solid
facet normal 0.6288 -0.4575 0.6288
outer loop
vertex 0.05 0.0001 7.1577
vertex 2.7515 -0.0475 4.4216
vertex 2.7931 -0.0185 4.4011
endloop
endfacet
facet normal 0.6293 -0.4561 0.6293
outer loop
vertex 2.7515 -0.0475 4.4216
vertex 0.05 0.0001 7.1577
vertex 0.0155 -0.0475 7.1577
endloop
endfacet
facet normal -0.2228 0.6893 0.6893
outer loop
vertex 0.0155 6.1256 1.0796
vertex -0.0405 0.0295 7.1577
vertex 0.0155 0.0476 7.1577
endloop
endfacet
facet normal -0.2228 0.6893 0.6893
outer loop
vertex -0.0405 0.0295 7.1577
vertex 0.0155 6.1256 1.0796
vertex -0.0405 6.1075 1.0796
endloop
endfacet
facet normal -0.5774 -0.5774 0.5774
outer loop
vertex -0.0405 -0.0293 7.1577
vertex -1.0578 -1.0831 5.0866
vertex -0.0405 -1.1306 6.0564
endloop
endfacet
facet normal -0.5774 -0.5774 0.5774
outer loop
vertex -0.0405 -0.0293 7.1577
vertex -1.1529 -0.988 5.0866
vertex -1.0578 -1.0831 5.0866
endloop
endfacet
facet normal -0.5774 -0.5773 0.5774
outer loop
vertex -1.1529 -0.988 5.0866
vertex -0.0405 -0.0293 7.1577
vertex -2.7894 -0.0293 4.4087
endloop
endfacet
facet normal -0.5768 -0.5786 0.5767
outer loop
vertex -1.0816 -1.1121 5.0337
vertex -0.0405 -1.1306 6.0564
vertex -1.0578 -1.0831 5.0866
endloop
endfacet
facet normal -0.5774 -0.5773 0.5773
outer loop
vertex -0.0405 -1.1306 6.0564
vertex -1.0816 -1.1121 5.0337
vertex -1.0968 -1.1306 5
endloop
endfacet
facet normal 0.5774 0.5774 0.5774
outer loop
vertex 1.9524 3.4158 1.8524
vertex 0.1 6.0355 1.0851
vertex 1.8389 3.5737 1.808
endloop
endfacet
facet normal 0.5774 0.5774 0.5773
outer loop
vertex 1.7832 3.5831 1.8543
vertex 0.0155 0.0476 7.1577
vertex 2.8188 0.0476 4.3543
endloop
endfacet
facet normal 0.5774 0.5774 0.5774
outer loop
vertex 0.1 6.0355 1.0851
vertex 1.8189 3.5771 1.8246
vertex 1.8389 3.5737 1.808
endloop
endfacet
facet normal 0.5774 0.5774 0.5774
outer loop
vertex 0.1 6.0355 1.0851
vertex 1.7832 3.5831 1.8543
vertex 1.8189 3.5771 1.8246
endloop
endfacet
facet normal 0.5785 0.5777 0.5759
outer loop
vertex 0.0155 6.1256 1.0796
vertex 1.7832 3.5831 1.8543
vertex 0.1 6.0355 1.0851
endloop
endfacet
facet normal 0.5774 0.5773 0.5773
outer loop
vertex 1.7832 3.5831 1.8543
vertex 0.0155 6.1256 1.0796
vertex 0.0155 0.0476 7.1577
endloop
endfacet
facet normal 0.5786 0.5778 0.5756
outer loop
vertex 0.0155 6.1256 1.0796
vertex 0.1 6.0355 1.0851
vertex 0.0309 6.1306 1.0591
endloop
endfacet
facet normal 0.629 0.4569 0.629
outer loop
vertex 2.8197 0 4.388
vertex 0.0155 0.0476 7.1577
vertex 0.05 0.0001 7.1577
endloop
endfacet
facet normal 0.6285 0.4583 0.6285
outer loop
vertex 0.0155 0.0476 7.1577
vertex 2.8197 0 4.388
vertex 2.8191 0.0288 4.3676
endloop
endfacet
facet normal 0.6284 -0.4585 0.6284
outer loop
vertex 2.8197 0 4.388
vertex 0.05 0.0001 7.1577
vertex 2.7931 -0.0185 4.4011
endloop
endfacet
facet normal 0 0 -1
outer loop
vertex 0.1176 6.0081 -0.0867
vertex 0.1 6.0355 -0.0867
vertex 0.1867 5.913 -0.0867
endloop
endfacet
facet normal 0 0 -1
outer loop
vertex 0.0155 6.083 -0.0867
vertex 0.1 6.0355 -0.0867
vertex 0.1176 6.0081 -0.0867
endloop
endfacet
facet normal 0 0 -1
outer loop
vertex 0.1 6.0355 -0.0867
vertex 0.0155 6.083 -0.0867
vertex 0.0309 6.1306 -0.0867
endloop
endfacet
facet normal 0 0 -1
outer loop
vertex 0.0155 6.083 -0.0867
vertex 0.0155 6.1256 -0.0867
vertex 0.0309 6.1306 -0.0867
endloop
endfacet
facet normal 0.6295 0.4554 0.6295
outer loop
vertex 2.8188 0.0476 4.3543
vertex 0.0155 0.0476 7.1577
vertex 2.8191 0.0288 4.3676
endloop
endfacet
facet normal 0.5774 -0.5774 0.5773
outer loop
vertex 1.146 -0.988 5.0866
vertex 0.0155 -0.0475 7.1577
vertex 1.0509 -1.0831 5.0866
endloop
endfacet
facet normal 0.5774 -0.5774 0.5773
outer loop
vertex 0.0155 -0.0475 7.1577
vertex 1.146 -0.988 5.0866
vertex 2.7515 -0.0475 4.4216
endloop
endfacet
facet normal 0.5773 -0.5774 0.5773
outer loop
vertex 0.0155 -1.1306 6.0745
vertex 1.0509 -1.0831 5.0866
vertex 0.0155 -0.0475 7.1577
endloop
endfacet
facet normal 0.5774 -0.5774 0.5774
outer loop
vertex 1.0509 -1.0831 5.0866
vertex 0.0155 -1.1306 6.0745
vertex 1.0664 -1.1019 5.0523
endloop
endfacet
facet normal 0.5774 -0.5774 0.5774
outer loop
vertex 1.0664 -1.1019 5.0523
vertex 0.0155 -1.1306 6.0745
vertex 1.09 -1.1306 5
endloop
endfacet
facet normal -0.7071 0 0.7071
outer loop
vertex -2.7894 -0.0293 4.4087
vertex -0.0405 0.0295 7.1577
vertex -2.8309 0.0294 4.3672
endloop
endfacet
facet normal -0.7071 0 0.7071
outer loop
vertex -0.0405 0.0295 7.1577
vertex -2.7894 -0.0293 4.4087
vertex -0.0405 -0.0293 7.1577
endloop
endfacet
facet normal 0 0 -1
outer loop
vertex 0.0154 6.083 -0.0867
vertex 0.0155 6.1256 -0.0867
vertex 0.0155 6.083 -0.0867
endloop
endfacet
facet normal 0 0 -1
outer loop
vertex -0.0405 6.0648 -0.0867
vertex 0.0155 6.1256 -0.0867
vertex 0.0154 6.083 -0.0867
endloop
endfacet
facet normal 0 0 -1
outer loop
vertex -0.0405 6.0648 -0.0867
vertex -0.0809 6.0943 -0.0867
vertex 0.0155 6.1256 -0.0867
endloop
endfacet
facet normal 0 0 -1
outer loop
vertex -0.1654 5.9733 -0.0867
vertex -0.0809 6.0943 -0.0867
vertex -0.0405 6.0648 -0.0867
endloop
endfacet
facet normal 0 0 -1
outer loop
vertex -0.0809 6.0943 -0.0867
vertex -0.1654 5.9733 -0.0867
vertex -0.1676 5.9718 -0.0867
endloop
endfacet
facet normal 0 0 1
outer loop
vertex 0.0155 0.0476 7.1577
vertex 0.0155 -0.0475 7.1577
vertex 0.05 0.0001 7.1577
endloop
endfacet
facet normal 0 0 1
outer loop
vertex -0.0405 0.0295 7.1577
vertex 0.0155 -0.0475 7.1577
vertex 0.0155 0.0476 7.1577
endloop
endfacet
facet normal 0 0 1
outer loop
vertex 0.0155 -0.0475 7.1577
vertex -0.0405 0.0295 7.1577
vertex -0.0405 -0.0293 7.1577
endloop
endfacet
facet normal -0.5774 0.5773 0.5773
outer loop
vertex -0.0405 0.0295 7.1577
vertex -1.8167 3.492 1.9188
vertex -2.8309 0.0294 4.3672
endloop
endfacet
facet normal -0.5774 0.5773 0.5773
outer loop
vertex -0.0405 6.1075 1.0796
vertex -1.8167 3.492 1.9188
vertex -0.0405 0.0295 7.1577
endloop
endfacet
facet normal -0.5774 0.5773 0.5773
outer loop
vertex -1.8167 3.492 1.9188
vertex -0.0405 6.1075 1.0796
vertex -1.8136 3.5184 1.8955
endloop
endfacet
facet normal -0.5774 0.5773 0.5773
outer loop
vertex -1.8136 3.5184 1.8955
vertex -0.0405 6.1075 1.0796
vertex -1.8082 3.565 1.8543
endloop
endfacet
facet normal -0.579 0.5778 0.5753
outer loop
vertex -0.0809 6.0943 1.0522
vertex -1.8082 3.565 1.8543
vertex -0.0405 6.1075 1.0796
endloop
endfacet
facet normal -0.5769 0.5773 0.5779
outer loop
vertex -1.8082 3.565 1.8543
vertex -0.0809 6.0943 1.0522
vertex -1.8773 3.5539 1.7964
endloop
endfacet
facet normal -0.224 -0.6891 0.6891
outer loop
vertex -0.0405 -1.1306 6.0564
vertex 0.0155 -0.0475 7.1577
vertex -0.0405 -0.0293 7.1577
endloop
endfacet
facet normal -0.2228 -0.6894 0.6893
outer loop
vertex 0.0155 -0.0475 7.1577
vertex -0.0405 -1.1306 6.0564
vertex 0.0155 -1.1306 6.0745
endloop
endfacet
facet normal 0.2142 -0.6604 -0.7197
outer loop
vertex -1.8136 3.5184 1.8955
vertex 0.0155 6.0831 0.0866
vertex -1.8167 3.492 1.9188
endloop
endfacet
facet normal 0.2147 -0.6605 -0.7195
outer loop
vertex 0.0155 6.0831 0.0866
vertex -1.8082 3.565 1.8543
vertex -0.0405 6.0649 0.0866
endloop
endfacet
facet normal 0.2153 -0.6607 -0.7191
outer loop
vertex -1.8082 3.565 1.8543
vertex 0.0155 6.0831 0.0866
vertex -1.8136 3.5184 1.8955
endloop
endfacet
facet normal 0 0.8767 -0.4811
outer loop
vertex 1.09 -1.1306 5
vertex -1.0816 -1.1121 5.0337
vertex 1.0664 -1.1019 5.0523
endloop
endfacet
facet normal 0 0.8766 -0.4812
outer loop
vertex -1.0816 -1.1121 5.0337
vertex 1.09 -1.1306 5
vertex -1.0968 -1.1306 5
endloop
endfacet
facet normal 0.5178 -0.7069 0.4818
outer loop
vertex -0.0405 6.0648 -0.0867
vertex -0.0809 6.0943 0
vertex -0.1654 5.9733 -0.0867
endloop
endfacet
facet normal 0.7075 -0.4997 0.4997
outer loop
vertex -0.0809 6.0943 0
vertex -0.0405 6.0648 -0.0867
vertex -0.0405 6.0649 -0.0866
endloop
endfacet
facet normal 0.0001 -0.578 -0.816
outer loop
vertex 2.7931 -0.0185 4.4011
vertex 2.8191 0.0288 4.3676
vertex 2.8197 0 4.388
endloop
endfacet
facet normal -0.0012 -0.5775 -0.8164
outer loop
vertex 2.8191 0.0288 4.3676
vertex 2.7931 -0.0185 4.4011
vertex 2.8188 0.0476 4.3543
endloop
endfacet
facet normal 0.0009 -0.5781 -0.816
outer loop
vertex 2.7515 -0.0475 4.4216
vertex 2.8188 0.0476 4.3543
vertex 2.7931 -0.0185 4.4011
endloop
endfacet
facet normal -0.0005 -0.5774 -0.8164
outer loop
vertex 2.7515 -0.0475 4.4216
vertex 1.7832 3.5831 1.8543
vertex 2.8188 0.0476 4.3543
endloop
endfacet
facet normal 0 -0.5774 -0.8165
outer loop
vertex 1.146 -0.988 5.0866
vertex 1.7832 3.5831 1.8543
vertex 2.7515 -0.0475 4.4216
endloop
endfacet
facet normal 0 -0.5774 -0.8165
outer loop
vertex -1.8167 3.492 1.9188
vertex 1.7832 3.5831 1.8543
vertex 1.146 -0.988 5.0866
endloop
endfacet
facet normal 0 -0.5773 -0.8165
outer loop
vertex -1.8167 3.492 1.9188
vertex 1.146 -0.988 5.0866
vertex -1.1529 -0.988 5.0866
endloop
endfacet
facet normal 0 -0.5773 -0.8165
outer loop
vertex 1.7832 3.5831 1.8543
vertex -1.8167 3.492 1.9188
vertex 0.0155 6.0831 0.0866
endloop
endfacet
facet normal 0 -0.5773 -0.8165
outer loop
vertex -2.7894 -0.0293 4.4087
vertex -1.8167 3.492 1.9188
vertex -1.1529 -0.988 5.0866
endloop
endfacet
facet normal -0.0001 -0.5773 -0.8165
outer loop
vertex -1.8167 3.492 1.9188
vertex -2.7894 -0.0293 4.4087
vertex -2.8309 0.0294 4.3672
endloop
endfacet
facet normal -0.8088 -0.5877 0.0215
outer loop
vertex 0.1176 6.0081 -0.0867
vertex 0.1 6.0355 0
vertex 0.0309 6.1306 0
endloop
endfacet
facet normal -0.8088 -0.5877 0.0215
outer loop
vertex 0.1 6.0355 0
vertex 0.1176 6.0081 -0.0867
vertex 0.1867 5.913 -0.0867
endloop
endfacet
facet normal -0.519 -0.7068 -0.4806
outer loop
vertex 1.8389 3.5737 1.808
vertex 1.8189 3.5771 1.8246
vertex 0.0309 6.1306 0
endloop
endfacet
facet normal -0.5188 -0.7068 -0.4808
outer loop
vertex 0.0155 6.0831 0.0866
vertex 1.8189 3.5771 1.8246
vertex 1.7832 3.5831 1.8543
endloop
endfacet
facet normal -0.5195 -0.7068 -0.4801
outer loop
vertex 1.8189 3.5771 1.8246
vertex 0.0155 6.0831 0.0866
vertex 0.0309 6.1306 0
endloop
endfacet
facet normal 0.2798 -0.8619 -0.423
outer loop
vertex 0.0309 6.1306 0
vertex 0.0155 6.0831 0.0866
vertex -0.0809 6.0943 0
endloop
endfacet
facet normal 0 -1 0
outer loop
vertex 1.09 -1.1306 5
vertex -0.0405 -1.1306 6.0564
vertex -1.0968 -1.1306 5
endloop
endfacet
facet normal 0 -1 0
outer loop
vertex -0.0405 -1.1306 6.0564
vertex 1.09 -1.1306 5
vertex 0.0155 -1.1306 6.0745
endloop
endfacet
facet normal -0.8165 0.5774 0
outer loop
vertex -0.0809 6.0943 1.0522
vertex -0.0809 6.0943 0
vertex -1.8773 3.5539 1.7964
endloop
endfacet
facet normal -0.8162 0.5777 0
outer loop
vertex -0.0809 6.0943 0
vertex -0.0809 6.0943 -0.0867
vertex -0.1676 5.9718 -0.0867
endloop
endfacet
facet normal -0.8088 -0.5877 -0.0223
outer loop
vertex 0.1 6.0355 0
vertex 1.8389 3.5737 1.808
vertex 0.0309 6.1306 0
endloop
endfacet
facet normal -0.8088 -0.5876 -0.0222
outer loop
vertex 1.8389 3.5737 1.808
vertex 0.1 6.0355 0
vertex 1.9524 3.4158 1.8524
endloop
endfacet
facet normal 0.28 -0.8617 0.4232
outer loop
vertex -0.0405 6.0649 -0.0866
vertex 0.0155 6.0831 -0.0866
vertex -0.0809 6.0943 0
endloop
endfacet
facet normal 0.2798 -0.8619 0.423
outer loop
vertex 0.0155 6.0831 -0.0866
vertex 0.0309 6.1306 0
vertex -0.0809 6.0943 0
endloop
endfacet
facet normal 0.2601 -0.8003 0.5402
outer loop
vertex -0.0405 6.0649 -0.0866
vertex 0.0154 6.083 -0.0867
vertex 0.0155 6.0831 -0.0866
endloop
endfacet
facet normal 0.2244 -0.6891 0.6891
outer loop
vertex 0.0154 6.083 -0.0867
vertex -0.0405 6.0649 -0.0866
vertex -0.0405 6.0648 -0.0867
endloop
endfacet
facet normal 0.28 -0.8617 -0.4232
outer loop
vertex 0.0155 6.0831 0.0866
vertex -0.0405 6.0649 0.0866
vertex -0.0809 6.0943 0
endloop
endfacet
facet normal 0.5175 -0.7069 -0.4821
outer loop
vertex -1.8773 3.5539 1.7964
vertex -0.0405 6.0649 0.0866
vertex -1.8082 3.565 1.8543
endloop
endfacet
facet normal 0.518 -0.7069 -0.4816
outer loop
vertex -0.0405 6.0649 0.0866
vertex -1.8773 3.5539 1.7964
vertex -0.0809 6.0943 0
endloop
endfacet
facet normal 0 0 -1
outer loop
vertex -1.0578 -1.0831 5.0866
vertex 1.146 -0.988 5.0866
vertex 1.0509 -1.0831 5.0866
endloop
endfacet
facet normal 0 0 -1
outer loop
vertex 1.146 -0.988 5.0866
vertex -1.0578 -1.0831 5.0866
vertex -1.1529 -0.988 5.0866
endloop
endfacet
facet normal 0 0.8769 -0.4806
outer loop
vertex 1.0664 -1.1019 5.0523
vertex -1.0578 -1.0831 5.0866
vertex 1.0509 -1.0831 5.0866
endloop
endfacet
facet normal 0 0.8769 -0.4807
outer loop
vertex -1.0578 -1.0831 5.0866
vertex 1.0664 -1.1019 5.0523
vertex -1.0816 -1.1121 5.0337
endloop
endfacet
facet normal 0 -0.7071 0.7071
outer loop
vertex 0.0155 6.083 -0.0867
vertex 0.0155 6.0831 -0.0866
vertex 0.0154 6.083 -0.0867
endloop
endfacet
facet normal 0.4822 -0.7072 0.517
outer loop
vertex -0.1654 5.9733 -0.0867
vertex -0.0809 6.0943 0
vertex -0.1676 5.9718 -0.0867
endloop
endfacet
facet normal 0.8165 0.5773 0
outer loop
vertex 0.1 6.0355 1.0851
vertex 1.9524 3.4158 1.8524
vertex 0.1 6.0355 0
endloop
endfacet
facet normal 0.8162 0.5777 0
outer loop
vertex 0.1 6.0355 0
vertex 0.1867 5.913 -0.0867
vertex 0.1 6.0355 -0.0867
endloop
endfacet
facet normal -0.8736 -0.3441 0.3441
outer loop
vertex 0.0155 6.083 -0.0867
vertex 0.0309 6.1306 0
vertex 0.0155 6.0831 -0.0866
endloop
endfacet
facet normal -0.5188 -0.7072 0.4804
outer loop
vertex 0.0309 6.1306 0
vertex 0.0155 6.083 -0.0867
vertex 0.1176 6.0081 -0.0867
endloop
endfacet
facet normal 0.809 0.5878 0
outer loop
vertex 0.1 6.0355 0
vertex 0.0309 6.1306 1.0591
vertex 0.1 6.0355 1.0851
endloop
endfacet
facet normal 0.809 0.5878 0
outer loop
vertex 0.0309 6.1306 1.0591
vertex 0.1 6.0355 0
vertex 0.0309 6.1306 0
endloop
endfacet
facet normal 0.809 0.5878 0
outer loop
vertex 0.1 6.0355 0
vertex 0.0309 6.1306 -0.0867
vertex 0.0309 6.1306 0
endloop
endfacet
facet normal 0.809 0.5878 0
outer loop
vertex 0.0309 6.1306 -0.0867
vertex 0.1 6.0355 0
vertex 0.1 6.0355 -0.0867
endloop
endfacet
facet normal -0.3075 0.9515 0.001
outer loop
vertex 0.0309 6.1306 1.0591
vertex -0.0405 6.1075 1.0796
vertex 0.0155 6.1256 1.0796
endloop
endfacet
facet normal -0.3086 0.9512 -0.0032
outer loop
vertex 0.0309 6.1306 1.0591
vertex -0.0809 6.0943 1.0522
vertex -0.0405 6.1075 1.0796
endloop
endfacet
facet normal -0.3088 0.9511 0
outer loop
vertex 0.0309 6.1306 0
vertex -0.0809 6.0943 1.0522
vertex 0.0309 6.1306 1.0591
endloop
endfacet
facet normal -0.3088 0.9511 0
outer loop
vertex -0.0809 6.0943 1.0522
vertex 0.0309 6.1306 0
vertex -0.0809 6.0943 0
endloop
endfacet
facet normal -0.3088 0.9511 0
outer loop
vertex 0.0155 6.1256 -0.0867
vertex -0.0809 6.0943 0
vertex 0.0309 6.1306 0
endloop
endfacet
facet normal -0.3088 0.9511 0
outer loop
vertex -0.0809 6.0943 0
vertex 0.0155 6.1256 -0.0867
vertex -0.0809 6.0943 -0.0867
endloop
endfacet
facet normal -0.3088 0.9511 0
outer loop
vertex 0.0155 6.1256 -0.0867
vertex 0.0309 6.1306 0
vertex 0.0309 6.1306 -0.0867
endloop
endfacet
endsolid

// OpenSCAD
// Auto-generated OpenSCAD file

    inner_points = 10*[[0.499999999647243, -0.10355339109877267, -0.5000000000000022], [-0.5000000003527529, -0.10355339028132902, 0.5000000000000022], [-0.5000000003527572, -0.10355339028132601, -0.49999999999999795], [0.4999999996472473, -0.10355339109877568, 0.49999999999999795], [2.2526713020467915e-10, 0.6035533904964967, 2.128597539314253e-15]];

    outer_points = 10*[[0.7071067811865476, 0.0, -2.669135025276785e-09], [-0.7071067811865476, 0.0, 2.669135025276785e-09], [-2.6278612663574398e-14, 0.7071067811522772, -6.961725442369196e-06], [2.6278612663574398e-14, -0.7071067811522772, 6.961725442369196e-06], [2.6691350251474237e-09, 6.961725442369196e-06, 0.7071067811522772]];

    // Convex hull for inner set (I)
    module inner_hull() {
        hull() {
            for (p = inner_points) {
                translate(p) sphere(r=0.1);
            }
        }
    }

    // Convex hull for outer set (O) minus inner hull (O \ I)
    module outer_minus_inner() {
        difference() {
            hull() {
                for (p = outer_points) {
                    translate(p) sphere(r=0.1);
                }
            }
            inner_hull(); // Subtract inner hull
        }
    }

    // Convex hull for outer set (O) minus all translated inner hulls
    module outer_minus_AllTranslationInner() {
        difference() {
            hull() {
                for (p = outer_points) {
                    translate(p) sphere(r=0.1);
                }
            }
            hull() {
                translate([0,0,50]) inner_hull();
                translate([0,0,-50]) inner_hull();
            }; // Subtract translated inner hulls
        }
    }

    // Difference between outer_minus_inner and outer_minus_AllTranslationInner
    module outer_minus_inner_diff() {
        difference() {
            // Outer minus inner
            difference() {
                hull() {
                    for (p = outer_points) {
                        translate(p) sphere(r=0.1);
                    }
                }
                inner_hull();
            }

            // Subtract Outer minus AllTranslationInner
            difference() {
                hull() {
                    for (p = outer_points) {
                        translate(p) sphere(r=0.1);
                    }
                }
                hull() {
                    translate([0,0,50]) inner_hull();
                    translate([0,0,-50]) inner_hull();
                };
            }
        }
    }

    // Rendering all with colors applied
    color([1, 1, 0, 1]) outer_minus_inner_diff(); // Opaque yellow
    
